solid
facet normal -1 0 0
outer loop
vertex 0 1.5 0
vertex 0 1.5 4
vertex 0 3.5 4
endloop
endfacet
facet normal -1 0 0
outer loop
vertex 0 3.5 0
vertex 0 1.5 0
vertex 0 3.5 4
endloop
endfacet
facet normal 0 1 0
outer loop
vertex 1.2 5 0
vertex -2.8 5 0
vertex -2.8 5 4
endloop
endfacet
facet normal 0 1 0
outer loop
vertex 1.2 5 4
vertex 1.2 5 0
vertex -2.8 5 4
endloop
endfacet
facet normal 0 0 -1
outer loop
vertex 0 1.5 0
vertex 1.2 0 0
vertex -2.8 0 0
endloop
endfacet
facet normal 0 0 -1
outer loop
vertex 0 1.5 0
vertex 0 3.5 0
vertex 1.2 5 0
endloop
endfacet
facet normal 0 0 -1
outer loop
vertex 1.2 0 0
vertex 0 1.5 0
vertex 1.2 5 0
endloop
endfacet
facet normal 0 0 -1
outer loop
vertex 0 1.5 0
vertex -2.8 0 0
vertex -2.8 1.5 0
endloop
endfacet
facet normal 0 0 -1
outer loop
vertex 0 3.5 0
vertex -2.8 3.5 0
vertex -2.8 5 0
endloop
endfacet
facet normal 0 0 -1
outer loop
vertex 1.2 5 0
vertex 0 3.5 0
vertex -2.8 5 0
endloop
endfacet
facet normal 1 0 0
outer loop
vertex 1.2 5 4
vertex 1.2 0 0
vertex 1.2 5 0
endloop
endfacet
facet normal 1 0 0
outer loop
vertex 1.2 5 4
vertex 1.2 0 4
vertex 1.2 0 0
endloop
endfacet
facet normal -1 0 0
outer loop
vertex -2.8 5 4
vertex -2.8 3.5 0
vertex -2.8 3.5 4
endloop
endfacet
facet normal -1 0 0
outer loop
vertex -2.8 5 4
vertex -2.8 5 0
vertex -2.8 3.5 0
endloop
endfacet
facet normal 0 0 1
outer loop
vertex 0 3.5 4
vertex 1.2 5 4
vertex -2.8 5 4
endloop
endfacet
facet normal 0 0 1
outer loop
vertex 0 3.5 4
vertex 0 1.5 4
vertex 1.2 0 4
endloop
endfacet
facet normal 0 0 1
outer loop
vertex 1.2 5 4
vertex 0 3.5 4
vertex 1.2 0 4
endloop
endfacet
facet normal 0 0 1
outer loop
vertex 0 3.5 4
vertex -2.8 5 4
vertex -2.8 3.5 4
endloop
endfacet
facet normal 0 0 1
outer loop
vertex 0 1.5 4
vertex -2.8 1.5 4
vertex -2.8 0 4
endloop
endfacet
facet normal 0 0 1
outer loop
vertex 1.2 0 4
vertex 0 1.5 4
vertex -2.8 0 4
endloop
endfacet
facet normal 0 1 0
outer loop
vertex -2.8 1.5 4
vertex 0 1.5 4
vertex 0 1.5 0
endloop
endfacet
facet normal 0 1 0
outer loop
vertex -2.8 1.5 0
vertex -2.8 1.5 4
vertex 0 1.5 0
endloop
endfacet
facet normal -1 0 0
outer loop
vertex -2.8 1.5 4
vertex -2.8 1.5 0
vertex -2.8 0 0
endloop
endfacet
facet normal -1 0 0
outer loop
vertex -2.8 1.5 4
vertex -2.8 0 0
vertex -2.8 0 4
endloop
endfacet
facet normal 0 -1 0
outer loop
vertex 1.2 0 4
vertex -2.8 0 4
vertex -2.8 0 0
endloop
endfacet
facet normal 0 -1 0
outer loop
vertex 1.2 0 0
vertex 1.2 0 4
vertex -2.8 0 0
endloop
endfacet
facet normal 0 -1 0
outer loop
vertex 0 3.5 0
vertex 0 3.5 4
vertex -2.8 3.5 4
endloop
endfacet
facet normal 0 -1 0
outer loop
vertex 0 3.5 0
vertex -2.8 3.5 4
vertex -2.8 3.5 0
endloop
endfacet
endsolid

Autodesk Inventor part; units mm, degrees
ref_plane "YZ Plane" through (0, 0, 0) normal (1, 0, 0) x (0, 1, 0)
ref_plane "XZ Plane" through (0, 0, 0) normal (0, 1, 0) x (-1, 0, 0)
ref_plane "XY Plane" through (0, 0, 0) normal (0, 0, 1) x (1, 0, 0)
sketch "Skizze1" plane through (0, 0, 0) normal (1, 0, 0) x (0, 1, 0)
  line L0 (0, 0) -> (5, 0)
  line L1 (5, 0) -> (5, 4)
  line L2 (5, 4) -> (0, 4)
  line L3 (0, 4) -> (0, 0)
  dimension "d0" = 5
  dimension "d1" = 4
extrude "Extrusion1" add sketch "Skizze1" along normal blind 1.2
sketch "Skizze2" plane through (0, 0, 0) normal (-1, 0, 0) x (0, 0, 1)
  line L0 (0, 0) -> (0, 5) projected
  line L1 (4, 0) -> (0, 0) projected
  line L2 (4, 5) -> (4, 0) projected
  line L3 (0, 5) -> (4, 5) projected
  line L4 (4, 3.5) -> (0, 3.5)
  line L5 (4, 1.5) -> (0, 1.5)
  dimension "d4" = 1.5
  dimension "d5" = 1.5
extrude "Extrusion2" add sketch "Skizze2" along normal blind 2.8 contours L0 L5 L2 L1 | L0 L3 L2 L4
properties part number "EE-SX1131"
